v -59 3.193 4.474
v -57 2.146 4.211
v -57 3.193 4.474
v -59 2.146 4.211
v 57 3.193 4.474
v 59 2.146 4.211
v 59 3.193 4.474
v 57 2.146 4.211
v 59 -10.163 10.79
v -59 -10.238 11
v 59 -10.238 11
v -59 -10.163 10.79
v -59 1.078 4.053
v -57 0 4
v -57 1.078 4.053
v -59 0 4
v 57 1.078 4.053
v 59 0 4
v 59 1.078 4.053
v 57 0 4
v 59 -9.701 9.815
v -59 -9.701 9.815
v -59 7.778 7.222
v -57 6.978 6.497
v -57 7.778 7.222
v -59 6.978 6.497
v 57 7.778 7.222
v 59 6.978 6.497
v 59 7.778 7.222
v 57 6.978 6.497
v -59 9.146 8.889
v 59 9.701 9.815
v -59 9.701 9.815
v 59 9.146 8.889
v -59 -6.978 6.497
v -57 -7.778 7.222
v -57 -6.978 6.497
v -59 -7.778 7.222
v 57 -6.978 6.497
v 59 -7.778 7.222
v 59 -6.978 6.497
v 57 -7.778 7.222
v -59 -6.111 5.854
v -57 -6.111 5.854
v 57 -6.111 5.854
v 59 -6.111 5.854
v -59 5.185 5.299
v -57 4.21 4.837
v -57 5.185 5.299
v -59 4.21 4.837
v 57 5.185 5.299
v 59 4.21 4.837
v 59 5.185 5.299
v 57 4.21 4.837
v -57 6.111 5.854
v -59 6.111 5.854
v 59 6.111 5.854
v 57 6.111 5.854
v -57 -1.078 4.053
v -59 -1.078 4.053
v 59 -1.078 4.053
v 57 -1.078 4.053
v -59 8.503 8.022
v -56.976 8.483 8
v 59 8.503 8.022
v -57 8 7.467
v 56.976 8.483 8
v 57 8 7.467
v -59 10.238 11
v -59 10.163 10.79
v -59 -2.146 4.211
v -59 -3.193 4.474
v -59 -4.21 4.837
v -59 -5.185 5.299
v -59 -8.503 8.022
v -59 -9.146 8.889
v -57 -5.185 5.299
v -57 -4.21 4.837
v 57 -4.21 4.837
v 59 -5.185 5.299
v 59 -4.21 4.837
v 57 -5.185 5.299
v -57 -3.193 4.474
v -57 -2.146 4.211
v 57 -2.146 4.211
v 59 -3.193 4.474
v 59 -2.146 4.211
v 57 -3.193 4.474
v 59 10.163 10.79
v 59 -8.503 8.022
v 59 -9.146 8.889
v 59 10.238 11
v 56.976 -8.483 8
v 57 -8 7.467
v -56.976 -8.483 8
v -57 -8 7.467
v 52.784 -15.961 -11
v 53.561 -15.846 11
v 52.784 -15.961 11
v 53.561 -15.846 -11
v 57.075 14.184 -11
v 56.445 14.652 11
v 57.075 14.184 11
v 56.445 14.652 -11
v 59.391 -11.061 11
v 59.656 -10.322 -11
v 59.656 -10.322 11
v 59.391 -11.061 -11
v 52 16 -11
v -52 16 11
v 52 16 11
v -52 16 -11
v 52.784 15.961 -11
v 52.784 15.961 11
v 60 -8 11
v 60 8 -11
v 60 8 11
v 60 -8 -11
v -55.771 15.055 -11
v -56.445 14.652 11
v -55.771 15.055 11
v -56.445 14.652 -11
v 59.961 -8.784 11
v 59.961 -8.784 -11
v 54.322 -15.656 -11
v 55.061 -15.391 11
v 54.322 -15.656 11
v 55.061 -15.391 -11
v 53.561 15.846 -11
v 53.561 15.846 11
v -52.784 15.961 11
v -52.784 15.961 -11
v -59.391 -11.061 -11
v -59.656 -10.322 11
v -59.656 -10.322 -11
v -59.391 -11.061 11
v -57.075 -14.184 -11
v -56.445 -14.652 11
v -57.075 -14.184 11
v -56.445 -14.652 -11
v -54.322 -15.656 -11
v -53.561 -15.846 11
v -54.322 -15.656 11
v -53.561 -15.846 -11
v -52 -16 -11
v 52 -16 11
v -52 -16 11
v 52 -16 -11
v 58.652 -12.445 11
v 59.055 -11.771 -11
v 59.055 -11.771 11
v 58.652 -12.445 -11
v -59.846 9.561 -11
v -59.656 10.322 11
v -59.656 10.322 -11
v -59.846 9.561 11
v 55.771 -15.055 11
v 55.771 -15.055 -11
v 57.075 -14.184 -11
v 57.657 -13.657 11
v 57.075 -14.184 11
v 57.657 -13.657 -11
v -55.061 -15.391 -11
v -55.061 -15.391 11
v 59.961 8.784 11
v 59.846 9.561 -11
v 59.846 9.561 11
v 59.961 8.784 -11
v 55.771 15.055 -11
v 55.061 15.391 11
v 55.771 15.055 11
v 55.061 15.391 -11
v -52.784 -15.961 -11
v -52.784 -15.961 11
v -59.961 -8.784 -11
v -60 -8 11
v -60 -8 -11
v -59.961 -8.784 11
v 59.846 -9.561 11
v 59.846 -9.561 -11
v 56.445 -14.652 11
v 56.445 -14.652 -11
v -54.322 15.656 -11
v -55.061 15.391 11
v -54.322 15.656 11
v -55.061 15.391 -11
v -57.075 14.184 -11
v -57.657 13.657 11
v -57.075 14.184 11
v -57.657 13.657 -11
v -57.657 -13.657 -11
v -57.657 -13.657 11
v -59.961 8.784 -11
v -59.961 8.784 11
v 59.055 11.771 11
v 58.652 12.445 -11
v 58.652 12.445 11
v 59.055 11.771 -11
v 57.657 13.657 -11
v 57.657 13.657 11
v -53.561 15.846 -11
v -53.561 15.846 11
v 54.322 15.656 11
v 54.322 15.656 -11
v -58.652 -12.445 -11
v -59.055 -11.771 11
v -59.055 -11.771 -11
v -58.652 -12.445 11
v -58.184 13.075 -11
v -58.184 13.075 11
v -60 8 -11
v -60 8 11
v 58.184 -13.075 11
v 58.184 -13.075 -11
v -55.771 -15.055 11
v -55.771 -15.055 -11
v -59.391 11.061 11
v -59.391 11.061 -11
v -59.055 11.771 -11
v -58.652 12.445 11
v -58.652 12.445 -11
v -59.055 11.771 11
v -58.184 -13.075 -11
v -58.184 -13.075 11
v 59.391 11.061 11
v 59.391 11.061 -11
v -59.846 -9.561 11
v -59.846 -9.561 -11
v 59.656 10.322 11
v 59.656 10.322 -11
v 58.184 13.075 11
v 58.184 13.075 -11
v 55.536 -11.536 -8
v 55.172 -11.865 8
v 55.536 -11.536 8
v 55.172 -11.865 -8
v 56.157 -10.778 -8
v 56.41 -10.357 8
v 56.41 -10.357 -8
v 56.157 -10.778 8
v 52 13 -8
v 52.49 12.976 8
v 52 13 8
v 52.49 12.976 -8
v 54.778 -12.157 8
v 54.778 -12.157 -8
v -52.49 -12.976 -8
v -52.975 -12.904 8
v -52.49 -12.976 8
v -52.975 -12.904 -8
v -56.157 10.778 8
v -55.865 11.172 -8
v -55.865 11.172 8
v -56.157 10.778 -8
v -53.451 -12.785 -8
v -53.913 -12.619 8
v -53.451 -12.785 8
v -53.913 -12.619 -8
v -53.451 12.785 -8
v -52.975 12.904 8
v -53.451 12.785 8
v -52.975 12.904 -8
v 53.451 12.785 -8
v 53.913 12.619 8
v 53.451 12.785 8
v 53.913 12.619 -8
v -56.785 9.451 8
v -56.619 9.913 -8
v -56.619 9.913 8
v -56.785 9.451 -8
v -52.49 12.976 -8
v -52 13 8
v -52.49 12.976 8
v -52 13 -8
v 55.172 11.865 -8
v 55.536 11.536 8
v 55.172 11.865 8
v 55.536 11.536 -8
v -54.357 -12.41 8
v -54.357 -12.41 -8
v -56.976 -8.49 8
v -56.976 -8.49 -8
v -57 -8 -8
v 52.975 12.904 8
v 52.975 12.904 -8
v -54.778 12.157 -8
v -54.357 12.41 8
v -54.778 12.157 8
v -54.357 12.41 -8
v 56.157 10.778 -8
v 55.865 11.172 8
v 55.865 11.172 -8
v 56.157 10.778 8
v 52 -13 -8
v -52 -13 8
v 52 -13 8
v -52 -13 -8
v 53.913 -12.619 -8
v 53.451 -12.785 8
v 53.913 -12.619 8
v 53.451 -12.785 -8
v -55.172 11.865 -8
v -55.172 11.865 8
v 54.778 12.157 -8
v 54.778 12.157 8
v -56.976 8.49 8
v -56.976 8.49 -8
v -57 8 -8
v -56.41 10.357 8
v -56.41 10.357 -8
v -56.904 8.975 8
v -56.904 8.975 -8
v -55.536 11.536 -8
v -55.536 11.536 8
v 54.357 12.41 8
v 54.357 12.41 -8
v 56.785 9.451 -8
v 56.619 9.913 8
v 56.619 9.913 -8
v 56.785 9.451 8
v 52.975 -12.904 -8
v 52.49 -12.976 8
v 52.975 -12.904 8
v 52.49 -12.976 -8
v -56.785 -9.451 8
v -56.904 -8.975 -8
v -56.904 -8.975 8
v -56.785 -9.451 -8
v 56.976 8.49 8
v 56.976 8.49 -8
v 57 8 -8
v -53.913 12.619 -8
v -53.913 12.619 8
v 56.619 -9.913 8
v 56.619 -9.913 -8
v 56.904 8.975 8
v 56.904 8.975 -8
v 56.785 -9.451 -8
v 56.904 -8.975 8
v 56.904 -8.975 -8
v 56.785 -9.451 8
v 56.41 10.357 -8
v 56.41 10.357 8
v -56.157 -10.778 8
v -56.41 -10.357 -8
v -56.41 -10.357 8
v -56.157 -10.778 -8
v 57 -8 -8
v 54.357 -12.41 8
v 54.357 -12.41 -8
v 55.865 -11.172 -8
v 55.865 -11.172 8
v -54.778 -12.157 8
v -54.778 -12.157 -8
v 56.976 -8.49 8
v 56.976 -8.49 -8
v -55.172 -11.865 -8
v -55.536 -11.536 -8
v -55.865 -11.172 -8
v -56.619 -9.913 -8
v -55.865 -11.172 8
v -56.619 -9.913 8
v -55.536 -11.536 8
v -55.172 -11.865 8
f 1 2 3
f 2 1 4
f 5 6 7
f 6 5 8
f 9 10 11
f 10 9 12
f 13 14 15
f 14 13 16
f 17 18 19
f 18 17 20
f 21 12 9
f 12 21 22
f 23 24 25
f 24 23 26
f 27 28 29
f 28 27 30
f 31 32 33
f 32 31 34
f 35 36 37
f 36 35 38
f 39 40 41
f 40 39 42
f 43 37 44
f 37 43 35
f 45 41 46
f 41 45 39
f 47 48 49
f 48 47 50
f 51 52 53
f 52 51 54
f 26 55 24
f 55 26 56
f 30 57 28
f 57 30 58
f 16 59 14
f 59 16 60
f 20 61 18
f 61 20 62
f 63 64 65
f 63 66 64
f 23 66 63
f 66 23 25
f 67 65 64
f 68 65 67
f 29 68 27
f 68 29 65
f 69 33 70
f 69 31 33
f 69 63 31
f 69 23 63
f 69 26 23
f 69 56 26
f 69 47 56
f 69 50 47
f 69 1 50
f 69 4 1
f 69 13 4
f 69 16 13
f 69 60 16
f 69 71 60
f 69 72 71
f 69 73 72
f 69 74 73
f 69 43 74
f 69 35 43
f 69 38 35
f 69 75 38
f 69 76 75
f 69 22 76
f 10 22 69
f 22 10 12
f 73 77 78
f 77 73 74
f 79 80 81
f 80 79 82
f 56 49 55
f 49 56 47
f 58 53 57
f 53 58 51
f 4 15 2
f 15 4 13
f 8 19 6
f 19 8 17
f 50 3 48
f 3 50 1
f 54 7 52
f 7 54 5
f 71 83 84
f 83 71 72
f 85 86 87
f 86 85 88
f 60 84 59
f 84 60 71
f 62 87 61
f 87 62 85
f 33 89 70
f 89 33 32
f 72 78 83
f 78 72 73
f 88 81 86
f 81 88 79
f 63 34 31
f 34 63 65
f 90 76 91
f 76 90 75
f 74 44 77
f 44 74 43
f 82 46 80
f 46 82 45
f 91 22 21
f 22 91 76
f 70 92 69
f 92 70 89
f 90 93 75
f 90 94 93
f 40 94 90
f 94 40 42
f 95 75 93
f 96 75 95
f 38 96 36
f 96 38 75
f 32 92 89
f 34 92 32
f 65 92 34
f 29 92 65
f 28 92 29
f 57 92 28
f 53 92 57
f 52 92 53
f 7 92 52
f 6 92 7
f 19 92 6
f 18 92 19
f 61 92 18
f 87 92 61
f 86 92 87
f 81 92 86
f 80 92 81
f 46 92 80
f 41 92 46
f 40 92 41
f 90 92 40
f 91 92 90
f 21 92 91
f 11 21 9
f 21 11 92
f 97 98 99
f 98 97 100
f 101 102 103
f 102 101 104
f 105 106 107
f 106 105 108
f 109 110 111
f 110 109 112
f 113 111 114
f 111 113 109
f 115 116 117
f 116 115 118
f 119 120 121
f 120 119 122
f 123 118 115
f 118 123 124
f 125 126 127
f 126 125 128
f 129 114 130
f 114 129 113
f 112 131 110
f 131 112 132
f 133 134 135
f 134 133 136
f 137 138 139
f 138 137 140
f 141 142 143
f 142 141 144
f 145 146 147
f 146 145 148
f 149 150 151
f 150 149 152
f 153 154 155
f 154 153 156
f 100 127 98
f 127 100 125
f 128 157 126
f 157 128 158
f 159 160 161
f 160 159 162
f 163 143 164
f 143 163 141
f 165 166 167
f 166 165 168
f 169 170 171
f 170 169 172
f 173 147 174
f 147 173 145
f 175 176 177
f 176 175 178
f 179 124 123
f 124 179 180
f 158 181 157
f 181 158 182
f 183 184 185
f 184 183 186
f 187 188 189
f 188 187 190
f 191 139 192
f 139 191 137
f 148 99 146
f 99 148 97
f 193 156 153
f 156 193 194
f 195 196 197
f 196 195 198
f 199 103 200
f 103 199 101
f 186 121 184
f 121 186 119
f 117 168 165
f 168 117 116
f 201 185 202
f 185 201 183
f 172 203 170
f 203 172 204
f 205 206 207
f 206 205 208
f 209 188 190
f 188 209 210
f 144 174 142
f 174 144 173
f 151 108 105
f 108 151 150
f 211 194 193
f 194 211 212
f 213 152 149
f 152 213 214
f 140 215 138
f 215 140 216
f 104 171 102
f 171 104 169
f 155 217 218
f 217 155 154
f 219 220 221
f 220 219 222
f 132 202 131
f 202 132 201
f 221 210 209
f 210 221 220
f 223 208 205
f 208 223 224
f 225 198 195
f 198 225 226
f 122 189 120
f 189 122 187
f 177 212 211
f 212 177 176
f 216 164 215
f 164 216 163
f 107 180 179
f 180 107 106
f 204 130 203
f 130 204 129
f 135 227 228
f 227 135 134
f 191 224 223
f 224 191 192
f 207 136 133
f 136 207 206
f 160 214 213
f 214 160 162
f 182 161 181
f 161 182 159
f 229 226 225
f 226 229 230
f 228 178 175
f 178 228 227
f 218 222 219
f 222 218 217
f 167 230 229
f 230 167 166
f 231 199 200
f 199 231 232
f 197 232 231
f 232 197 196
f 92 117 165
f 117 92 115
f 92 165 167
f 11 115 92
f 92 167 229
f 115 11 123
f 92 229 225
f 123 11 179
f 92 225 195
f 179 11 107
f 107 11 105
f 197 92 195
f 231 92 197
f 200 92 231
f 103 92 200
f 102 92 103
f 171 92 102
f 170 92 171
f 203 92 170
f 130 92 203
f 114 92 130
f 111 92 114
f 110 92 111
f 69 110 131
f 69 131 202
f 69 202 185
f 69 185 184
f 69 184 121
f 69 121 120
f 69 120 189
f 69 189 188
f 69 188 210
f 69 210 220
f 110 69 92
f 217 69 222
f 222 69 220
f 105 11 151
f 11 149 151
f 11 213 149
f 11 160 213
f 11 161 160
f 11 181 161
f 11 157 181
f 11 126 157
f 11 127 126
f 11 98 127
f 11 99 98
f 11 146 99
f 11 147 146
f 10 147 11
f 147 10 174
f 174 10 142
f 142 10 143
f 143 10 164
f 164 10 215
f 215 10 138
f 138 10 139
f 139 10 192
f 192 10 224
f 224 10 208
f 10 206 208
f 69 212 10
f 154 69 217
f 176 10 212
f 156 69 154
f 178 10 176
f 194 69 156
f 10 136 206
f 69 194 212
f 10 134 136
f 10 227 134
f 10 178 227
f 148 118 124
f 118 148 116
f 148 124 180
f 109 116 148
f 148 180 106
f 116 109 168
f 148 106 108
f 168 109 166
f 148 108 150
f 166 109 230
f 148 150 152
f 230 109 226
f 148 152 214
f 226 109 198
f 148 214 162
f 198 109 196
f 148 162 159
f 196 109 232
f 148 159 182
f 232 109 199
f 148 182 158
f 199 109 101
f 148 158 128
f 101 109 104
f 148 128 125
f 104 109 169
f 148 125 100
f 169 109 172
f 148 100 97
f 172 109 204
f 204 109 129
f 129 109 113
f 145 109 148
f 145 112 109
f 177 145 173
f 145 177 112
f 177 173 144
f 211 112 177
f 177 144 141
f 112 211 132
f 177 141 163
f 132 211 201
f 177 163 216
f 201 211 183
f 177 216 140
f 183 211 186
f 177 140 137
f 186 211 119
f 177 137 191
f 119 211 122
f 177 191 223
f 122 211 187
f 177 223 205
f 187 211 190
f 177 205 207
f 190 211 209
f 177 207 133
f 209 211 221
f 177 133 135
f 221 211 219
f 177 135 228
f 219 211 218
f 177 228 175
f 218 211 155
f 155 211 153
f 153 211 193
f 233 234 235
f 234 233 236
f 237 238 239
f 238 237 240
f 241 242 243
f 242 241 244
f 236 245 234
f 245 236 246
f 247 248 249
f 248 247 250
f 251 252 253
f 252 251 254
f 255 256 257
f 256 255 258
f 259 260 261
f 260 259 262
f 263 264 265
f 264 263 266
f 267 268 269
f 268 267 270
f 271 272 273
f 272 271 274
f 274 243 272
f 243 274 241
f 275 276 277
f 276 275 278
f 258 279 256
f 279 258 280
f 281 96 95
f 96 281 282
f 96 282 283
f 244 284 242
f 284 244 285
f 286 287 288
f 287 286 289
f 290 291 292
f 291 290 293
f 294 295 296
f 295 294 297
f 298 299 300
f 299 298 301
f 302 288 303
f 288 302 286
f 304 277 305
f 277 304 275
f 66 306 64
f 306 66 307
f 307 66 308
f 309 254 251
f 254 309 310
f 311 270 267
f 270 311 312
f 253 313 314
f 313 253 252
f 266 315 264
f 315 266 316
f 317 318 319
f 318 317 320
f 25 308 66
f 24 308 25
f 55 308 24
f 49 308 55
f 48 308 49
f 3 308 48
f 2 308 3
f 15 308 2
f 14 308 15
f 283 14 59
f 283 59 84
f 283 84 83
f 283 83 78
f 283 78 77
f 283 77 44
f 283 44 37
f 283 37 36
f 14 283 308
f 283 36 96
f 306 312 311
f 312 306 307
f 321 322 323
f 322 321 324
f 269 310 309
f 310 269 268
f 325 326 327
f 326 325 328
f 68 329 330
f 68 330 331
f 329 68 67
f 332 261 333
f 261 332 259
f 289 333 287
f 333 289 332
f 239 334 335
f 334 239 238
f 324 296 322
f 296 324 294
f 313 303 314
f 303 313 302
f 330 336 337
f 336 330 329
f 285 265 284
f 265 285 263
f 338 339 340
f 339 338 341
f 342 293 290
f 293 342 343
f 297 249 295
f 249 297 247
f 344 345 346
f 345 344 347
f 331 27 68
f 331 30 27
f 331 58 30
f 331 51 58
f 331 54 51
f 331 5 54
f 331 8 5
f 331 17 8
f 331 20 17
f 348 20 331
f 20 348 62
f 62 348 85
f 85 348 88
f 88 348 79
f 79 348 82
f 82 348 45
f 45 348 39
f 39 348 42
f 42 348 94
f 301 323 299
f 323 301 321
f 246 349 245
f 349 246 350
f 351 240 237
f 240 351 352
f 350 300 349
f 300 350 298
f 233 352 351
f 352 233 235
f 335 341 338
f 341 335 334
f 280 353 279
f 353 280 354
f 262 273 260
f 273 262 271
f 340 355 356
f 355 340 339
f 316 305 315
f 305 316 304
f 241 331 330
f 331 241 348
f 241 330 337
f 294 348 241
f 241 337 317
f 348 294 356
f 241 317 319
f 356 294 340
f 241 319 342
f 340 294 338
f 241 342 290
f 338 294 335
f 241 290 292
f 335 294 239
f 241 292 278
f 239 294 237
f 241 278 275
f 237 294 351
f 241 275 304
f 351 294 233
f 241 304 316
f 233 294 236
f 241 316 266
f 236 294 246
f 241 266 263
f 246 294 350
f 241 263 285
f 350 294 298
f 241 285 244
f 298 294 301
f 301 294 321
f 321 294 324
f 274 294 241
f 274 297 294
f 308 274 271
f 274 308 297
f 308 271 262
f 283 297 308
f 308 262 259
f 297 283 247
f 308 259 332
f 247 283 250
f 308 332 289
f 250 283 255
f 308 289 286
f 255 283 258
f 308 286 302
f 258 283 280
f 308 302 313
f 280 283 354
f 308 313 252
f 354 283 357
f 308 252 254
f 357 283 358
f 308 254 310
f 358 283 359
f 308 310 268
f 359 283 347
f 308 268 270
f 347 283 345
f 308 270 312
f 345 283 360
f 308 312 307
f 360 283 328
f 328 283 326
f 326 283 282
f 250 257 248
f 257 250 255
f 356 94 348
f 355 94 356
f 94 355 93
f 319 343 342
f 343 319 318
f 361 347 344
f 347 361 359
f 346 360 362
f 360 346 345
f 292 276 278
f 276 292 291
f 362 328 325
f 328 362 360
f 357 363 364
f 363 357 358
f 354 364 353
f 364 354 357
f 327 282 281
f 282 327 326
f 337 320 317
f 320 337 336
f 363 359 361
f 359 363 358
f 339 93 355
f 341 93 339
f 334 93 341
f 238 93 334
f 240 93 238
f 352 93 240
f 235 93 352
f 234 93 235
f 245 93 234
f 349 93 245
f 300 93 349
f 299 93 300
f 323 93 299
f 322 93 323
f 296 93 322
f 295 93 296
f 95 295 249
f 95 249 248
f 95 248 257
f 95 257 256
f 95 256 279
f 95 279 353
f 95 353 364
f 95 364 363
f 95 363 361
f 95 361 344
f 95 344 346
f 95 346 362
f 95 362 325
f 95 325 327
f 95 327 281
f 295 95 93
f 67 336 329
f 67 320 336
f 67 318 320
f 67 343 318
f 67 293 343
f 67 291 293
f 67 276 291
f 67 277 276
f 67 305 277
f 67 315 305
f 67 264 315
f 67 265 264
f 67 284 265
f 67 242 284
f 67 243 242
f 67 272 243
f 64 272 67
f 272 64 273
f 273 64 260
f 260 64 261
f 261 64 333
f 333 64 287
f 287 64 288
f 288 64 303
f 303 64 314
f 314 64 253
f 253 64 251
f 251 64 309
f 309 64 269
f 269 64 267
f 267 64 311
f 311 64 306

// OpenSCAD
// Flat pipe with four finger grooves
// Designed for hand-held grip using OpenSCAD

$fn = 64; // smoothness for cylinders

// Overall dimensions (in millimeters)
pipe_length = 120;
pipe_width = 32;
pipe_thickness = 22;
wall_thickness = 3;
corner_radius = 8;

// Finger groove settings
finger_count = 4;
finger_radius = 11;
finger_depth = 7;
finger_margin = 18;

module rounded_prism(length, width, height, radius) {
    // Create a rectangular prism with rounded edges using hull of cylinders
    hull() {
        for (x = [-length/2 + radius, length/2 - radius])
            for (y = [-width/2 + radius, width/2 - radius])
                translate([x, y, 0])
                    cylinder(r = radius, h = height, center = true);
    }
}

module flat_pipe() {
    difference() {
        // Outer shell
        rounded_prism(pipe_length, pipe_width, pipe_thickness, corner_radius);

        // Hollow interior
        translate([0, 0, 0])
            rounded_prism(pipe_length - 2 * wall_thickness,
                          pipe_width - 2 * wall_thickness,
                          pipe_thickness - 2 * wall_thickness,
                          max(corner_radius - wall_thickness, 1));

        // Finger grooves along the top surface
        groove_spacing = (pipe_length - 2 * finger_margin) / (finger_count - 1);
        for (i = [0 : finger_count - 1]) {
            x_pos = -pipe_length/2 + finger_margin + i * groove_spacing;
            translate([x_pos, 0, pipe_thickness/2 - finger_depth + finger_radius])
                rotate([0, 90, 0])
                    cylinder(r = finger_radius, h = pipe_width + 2, center = true);
        }
    }
}

flat_pipe();
